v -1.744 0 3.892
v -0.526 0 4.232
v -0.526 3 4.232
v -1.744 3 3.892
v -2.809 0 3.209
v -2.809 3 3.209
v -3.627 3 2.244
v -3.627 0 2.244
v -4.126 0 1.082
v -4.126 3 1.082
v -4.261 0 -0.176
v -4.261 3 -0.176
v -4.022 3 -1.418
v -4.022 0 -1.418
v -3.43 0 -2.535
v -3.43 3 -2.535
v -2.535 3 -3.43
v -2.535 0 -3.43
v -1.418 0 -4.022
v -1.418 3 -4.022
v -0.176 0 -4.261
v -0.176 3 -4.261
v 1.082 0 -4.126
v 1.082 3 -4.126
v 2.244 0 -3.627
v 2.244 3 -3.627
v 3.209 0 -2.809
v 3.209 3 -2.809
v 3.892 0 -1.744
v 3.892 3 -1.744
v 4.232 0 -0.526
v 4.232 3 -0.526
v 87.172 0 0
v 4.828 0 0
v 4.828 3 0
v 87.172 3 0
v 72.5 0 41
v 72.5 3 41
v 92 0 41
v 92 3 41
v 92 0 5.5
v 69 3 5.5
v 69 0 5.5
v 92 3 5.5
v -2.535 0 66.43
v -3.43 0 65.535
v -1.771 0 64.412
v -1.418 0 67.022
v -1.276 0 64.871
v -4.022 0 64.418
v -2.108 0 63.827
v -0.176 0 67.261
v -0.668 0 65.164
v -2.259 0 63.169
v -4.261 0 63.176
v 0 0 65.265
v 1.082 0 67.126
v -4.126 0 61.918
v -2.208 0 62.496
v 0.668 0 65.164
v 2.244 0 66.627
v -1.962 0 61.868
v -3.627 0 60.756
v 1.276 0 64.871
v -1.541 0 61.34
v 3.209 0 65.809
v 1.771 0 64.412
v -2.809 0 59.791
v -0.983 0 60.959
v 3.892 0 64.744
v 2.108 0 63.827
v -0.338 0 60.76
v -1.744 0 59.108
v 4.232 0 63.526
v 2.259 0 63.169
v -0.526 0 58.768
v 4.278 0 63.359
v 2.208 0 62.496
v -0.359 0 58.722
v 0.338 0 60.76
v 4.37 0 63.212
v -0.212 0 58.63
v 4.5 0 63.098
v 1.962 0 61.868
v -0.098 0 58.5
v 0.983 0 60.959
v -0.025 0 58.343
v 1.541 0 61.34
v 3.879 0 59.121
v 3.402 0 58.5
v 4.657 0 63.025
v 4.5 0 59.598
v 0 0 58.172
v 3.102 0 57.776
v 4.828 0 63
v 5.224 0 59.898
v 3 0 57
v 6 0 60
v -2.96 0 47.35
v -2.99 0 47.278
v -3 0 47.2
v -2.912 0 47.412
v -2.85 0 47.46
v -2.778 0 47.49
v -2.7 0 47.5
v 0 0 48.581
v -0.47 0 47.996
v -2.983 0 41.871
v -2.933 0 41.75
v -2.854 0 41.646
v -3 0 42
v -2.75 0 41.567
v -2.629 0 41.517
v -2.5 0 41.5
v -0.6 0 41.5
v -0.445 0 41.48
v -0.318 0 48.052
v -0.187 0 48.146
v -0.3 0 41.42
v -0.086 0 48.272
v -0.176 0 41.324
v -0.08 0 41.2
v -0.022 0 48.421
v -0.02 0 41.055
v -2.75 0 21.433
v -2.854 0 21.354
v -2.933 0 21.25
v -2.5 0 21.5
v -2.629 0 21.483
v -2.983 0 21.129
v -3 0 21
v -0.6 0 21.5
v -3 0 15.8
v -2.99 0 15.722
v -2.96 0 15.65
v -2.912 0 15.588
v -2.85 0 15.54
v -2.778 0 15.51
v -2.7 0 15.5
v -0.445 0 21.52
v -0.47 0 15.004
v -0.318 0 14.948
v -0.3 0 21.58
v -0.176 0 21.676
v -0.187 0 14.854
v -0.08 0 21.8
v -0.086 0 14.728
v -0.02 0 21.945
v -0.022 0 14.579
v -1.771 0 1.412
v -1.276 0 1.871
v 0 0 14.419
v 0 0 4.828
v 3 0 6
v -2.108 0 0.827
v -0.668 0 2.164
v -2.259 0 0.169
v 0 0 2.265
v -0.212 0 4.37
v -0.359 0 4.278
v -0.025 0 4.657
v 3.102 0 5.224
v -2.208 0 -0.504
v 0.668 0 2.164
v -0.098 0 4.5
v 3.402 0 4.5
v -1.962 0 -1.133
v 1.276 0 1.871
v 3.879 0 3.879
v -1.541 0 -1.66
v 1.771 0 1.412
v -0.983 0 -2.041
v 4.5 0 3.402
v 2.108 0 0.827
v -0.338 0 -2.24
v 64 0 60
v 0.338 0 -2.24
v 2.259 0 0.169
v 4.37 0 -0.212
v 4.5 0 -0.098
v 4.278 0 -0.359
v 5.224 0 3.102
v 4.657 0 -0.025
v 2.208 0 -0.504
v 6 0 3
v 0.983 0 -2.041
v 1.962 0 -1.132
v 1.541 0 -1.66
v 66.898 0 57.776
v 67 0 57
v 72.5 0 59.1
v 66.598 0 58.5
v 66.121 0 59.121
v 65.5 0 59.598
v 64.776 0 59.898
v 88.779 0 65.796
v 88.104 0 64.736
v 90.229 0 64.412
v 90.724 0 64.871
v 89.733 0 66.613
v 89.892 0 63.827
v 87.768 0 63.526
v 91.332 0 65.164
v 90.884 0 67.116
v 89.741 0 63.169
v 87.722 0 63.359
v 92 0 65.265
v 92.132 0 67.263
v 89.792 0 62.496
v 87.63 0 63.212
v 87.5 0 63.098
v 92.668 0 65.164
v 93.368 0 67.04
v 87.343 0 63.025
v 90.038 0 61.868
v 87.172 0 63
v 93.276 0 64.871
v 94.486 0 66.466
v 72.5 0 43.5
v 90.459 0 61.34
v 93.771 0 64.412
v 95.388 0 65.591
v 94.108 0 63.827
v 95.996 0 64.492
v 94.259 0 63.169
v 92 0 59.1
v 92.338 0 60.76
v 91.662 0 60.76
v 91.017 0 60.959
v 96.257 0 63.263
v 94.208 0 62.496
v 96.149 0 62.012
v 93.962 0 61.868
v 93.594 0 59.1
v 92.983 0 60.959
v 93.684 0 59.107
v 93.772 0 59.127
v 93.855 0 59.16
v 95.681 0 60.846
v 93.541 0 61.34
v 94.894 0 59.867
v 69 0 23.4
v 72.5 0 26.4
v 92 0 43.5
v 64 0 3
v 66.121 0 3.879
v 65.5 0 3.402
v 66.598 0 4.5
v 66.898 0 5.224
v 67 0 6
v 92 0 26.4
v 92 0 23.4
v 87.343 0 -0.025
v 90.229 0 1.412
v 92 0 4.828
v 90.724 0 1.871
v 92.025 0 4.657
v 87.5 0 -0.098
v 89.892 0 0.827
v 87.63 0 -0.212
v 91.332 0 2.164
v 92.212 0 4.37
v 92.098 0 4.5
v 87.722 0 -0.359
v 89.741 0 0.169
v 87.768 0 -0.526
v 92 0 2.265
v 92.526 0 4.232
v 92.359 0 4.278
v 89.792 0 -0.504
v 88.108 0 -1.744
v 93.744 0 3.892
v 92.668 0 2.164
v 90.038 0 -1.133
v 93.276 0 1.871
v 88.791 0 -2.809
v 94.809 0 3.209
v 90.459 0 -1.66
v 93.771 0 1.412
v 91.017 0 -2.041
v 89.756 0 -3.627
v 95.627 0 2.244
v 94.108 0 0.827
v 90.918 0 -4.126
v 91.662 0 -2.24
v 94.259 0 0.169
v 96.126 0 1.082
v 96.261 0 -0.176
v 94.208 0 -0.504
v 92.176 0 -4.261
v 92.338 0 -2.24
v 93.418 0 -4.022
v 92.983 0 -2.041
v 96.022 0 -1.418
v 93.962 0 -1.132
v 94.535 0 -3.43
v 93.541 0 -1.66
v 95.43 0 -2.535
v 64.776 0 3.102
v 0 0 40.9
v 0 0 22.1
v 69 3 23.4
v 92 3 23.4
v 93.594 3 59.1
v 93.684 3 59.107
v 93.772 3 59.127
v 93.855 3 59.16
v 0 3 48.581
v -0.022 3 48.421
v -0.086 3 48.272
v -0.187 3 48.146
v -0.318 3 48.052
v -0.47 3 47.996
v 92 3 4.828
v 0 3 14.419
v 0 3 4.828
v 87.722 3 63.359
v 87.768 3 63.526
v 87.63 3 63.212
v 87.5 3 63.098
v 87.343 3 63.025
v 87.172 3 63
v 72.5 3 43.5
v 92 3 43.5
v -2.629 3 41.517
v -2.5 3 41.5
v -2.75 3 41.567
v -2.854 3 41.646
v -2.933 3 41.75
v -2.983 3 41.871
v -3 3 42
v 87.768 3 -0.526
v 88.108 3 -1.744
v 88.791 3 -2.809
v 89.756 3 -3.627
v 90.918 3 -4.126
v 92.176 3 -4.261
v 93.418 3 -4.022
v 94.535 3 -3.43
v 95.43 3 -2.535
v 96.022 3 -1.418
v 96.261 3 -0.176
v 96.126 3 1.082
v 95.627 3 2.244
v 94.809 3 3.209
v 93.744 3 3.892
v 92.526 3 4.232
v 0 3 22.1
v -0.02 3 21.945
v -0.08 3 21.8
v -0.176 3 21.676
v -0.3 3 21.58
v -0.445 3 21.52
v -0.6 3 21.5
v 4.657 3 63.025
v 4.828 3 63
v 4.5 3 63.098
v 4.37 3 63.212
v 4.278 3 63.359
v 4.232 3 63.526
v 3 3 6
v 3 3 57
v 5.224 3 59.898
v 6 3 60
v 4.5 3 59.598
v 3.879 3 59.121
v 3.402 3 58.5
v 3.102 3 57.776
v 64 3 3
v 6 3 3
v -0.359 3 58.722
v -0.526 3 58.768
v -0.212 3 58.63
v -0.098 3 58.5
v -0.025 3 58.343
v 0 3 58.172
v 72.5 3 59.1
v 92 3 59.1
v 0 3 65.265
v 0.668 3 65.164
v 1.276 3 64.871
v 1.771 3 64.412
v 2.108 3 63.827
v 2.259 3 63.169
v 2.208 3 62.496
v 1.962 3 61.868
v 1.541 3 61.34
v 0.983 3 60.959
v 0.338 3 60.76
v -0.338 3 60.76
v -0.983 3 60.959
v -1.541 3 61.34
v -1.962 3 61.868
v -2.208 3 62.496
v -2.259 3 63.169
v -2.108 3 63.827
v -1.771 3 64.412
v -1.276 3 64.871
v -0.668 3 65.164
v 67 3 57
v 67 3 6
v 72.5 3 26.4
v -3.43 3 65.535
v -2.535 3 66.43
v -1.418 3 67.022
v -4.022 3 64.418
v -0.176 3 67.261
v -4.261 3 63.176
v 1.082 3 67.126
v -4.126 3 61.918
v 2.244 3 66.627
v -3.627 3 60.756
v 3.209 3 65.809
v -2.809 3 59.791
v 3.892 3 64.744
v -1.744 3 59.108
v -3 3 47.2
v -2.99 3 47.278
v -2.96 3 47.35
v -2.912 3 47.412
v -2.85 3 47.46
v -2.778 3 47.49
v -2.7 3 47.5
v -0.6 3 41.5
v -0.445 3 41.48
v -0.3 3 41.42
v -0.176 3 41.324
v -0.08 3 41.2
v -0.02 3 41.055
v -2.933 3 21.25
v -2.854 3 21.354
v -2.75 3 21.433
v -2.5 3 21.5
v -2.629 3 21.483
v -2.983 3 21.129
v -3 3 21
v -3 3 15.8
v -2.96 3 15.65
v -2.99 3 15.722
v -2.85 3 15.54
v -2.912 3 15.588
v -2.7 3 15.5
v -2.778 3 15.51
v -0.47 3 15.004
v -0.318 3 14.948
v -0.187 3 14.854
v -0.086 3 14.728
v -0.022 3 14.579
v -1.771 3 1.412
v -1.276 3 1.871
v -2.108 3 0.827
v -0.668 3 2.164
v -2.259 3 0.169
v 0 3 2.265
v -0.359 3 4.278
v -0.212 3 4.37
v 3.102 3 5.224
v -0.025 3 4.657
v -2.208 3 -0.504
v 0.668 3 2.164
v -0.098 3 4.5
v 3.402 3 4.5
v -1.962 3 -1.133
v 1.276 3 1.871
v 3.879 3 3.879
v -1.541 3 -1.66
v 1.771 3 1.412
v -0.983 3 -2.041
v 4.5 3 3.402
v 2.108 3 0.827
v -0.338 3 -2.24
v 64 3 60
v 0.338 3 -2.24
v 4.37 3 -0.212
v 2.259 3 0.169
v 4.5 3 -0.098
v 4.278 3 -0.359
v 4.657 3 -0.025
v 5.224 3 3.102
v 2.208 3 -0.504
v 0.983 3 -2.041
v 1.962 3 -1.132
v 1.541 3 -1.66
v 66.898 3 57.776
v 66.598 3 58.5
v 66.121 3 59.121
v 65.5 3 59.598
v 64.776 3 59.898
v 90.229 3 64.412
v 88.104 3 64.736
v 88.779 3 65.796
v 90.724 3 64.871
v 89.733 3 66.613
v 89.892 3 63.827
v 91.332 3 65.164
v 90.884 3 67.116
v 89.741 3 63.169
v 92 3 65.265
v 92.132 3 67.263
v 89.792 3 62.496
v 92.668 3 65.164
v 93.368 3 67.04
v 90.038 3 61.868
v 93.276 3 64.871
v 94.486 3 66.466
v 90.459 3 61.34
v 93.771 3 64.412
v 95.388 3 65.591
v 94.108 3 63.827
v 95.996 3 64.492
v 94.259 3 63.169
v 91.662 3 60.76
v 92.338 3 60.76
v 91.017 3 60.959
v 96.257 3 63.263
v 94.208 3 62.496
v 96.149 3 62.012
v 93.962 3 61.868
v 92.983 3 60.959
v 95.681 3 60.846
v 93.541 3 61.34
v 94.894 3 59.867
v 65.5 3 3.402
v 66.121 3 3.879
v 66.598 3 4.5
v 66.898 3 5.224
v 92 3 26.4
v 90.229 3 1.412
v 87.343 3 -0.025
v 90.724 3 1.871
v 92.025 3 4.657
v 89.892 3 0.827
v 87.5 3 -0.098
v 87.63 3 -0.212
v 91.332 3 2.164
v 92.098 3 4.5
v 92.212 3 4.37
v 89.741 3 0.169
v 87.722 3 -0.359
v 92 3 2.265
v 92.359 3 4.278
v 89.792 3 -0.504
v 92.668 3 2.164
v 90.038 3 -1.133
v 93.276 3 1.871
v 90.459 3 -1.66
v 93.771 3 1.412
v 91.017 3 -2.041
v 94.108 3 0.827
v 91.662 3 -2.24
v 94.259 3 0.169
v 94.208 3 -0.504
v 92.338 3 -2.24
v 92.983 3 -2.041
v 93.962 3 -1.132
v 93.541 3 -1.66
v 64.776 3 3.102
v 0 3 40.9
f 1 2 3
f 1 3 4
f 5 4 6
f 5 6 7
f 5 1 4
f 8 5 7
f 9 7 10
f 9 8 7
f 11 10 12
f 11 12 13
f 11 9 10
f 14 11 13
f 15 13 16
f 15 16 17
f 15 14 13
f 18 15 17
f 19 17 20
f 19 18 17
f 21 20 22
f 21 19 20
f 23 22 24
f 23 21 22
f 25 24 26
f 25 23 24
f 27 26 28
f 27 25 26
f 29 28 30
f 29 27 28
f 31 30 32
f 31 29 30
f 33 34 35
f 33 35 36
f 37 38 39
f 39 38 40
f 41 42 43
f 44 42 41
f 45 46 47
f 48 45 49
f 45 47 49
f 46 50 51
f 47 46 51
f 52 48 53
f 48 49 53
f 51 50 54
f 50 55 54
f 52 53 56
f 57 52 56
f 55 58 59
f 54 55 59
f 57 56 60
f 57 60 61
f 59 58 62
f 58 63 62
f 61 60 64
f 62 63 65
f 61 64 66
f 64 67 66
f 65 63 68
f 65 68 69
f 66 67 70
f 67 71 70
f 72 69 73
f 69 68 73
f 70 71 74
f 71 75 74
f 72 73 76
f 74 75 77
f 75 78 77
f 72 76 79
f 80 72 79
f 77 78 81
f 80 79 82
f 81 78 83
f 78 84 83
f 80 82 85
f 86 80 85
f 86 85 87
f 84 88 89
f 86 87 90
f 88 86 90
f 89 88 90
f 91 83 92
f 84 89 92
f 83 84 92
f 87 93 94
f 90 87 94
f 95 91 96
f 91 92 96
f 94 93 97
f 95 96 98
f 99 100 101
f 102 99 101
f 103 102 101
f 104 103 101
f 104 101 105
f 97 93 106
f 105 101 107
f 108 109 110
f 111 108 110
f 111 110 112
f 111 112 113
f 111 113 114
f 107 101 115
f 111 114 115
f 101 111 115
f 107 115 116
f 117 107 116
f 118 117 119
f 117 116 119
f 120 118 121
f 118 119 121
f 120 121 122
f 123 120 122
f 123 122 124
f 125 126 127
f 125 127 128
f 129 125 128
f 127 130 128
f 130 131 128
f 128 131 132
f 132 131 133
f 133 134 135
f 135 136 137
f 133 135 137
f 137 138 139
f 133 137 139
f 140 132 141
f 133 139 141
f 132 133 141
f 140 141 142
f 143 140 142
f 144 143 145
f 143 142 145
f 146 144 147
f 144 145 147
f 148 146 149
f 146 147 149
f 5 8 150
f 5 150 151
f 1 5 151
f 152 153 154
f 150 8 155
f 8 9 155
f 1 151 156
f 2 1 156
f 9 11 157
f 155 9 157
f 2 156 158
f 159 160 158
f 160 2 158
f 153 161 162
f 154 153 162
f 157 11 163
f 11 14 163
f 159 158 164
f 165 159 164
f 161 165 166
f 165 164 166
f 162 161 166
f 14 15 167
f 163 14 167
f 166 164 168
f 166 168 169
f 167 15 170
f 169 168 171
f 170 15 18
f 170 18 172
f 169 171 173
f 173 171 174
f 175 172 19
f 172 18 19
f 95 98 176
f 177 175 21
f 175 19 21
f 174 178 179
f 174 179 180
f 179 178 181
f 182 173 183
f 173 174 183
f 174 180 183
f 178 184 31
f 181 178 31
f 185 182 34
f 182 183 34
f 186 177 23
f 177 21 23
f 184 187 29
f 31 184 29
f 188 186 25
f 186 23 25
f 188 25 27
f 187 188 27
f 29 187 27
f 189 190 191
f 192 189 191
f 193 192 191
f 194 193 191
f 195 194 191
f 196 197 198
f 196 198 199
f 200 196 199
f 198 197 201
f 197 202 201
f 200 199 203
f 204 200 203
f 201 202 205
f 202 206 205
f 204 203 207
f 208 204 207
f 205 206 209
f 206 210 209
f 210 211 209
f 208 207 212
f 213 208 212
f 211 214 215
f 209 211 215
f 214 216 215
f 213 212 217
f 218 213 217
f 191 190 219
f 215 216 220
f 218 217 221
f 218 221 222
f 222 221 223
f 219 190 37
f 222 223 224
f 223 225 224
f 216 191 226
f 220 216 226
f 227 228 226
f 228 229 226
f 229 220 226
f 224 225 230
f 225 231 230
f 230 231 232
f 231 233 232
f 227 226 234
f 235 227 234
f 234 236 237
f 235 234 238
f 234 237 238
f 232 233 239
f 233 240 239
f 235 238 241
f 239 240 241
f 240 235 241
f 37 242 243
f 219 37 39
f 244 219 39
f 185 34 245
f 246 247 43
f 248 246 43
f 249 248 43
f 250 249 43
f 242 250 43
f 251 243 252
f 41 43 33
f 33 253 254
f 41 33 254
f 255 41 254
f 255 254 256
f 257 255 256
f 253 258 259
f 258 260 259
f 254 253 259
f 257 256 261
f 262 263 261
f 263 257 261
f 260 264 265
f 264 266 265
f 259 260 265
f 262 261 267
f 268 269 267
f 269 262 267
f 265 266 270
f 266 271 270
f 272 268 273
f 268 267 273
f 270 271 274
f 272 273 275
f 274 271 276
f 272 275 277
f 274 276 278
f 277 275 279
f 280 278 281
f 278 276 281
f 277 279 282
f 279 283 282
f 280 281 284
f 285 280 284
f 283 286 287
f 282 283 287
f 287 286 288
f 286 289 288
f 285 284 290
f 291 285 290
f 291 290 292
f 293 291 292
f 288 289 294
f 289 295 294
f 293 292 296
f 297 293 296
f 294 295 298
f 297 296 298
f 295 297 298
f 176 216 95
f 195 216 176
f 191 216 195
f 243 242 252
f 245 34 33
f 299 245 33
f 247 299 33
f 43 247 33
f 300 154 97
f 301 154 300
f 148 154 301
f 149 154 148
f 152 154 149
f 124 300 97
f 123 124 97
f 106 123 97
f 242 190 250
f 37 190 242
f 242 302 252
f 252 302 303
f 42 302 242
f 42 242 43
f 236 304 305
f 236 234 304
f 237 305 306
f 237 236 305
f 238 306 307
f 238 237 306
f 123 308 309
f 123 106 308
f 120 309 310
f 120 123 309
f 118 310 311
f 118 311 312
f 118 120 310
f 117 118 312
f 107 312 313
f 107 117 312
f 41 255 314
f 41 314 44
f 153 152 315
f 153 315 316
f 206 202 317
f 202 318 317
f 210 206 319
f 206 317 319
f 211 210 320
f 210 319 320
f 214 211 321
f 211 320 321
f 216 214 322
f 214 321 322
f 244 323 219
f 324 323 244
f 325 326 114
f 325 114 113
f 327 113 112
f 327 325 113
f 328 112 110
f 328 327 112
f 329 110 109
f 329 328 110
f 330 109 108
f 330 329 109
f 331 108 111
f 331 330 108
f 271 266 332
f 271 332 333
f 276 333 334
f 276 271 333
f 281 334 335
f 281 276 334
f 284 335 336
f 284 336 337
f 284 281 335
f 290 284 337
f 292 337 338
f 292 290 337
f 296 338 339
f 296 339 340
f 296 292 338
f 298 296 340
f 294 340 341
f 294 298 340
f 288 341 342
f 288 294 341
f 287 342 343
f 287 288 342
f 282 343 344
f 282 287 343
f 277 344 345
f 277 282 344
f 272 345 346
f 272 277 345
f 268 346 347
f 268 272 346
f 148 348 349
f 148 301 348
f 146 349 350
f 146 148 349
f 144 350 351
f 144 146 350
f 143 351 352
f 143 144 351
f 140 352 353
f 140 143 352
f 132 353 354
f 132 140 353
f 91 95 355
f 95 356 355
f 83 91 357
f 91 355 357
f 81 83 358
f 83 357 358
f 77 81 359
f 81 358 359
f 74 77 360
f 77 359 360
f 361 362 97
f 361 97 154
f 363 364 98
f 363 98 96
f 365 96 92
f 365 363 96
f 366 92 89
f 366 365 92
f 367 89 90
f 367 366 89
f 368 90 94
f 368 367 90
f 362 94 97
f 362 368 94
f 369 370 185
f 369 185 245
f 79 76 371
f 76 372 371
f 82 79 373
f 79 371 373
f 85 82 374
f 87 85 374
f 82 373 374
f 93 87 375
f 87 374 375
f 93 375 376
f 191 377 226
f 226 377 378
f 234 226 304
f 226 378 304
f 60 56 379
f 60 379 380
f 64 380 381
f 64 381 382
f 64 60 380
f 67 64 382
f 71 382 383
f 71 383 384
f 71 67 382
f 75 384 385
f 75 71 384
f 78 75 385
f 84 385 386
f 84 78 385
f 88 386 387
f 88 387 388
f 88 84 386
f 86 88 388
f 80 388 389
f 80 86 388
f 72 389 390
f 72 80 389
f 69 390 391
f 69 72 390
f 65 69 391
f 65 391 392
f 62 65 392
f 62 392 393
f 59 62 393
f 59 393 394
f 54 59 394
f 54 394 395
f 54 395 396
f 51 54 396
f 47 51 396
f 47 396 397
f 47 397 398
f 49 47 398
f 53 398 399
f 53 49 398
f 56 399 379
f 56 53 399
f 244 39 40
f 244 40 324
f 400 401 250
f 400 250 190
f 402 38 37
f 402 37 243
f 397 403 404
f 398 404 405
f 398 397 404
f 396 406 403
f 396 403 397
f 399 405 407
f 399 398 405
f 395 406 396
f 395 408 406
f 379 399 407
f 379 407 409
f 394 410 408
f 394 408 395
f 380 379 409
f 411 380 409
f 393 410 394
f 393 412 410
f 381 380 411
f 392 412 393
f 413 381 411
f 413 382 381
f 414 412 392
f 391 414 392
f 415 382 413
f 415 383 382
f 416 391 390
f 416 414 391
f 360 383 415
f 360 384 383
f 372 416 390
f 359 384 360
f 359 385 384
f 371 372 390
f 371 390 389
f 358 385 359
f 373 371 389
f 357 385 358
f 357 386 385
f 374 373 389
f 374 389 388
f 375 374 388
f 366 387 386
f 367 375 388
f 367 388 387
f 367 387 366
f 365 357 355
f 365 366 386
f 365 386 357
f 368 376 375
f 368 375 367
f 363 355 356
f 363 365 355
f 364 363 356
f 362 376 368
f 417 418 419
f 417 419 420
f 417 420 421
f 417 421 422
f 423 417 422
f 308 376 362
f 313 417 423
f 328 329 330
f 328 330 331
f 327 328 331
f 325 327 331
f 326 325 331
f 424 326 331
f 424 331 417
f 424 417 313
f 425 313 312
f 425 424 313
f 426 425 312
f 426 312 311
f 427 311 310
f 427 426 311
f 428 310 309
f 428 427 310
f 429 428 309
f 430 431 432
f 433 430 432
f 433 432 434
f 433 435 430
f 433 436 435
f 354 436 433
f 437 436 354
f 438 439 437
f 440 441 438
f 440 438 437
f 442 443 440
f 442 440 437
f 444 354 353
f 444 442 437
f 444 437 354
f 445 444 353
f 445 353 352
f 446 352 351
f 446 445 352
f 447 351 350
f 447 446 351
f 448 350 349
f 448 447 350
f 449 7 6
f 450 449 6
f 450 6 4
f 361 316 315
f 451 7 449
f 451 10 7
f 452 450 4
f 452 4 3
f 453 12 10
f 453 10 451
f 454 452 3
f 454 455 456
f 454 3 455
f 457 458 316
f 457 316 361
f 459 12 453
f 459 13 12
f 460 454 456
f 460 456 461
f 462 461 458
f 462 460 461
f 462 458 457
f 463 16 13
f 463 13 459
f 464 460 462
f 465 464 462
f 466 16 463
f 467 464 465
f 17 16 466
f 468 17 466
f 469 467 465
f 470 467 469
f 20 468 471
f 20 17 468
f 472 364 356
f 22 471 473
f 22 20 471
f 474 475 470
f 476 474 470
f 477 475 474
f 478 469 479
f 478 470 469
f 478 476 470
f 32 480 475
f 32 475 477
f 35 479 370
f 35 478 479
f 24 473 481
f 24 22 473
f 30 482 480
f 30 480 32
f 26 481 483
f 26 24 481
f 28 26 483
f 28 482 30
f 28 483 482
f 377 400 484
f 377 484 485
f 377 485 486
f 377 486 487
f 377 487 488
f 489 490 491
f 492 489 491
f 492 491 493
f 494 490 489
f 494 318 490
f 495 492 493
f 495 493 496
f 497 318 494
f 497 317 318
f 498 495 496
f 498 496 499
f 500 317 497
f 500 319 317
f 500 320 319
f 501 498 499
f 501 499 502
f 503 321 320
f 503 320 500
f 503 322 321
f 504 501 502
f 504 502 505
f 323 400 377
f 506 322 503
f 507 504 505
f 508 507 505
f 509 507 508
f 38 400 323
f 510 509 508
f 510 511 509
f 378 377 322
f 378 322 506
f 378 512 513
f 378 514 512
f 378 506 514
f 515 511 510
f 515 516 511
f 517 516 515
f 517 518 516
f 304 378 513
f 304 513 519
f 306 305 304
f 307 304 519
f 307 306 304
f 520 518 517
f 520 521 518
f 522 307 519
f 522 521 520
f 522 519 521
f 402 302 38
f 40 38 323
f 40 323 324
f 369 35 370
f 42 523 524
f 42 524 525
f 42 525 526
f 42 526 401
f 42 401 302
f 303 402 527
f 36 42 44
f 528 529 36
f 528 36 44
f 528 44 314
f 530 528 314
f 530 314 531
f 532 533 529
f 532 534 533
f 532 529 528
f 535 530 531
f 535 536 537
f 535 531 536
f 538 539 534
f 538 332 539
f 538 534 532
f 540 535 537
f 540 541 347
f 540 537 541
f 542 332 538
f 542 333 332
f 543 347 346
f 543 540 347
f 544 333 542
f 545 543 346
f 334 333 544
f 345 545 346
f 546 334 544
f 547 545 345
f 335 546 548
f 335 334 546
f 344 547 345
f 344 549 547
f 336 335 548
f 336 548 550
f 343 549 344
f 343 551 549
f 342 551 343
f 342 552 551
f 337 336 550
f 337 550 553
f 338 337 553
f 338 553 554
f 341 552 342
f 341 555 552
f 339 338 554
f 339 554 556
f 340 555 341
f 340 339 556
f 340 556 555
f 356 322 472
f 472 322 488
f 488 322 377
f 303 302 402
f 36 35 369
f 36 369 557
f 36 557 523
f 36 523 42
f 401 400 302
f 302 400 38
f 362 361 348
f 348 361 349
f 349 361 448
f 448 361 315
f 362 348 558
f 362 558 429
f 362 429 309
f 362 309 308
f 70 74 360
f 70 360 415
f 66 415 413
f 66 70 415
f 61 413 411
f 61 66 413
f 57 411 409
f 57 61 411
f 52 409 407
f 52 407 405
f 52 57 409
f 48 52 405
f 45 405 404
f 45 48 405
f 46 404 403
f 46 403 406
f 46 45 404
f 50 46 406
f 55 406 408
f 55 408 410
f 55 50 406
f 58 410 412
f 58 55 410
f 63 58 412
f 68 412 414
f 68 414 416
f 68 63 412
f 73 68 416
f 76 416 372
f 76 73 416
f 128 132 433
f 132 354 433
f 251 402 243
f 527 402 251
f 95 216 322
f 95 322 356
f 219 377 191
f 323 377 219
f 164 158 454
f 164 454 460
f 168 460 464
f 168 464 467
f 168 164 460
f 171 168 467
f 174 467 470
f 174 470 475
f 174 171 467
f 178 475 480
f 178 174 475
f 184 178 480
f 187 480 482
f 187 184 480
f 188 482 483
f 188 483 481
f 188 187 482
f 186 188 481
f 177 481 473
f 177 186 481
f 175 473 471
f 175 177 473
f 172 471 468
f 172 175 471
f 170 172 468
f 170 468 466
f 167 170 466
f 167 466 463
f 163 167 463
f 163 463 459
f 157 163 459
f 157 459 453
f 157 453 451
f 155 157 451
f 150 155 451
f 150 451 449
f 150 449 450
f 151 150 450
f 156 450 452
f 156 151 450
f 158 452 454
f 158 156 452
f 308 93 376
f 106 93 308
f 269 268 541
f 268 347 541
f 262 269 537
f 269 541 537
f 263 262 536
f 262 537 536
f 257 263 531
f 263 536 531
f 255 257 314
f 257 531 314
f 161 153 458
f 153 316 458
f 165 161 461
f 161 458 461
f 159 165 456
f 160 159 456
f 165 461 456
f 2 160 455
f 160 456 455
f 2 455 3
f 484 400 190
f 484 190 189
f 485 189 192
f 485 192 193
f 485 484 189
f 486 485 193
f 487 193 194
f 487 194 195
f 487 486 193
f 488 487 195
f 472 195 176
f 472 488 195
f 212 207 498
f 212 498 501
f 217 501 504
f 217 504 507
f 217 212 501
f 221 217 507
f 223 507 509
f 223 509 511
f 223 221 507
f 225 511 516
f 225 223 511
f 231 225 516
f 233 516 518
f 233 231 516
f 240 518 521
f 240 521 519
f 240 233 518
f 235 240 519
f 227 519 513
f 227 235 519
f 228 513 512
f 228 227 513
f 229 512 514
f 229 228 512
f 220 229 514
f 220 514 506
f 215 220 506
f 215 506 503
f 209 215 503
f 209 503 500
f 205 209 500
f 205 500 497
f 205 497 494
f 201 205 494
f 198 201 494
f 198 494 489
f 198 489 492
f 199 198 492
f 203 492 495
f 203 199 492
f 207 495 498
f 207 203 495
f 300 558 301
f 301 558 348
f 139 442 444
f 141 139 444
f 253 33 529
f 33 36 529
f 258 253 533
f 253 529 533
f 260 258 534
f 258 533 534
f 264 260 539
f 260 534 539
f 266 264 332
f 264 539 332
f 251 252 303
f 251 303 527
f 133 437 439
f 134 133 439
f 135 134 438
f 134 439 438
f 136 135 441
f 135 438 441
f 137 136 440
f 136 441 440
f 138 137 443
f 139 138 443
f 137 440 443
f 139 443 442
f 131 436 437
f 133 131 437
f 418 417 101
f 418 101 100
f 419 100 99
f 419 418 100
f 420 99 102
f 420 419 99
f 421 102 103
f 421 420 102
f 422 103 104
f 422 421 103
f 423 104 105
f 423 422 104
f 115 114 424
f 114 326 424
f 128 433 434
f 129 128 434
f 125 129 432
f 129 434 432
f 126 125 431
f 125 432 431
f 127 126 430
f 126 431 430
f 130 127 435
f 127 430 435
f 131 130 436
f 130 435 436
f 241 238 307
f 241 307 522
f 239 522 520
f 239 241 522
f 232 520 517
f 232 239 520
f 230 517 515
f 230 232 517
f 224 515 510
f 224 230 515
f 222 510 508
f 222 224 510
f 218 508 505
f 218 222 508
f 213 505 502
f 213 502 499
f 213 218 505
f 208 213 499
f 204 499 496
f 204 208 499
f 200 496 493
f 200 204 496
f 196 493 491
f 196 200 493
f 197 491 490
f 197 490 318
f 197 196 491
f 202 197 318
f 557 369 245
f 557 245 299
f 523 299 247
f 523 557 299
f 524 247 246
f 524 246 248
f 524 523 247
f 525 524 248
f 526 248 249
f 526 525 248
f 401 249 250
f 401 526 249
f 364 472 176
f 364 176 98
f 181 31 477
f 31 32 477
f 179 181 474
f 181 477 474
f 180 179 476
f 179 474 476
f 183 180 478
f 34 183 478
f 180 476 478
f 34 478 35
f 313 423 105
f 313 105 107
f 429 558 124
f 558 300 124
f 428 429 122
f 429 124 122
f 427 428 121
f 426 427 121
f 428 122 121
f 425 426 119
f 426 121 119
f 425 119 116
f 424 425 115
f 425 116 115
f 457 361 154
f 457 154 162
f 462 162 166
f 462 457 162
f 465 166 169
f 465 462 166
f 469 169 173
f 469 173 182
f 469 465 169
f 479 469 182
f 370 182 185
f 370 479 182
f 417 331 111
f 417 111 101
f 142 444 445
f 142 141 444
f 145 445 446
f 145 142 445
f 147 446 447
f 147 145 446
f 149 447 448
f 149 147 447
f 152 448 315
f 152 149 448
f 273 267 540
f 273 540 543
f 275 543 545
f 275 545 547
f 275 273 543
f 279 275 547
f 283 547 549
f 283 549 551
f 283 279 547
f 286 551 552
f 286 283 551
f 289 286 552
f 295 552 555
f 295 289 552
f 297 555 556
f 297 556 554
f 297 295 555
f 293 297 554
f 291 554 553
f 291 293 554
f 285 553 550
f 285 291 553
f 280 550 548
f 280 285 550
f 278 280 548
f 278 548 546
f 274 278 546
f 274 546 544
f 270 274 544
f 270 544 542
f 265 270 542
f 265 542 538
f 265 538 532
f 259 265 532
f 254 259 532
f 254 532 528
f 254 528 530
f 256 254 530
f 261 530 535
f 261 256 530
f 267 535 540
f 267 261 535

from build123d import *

# Parameters (mm, degrees)
SKETCH1_R           = 2.265
BOSS_EXTRUDE1_DEPTH = 3
SKETCH2_W           = 6.5
SKETCH2_H           = 20
CUT_EXTRUDE1_DEPTH  = 3
BOSS_EXTRUDE2_DEPTH = 3
CUT_EXTRUDE2_DEPTH  = 3
SKETCH5_W           = 3
SKETCH5_H           = 20
BOSS_EXTRUDE3_DEPTH = 3
SKETCH6_W           = 27.010134686
SKETCH6_H           = 17.9
CUT_EXTRUDE3_DEPTH  = 3
SKETCH7_W           = 19.5
SKETCH7_H           = 14.6
CUT_EXTRUDE4_DEPTH  = 3
SKETCH8_W           = 19.5
SKETCH8_H           = 15.6
CUT_EXTRUDE5_DEPTH  = 3
SKETCH9_W           = 2.019620965
SKETCH9_H           = 0.574286347
CUT_EXTRUDE6_DEPTH  = 3
FILLET1_R           = 0.6


with BuildPart() as part:
    # Sketch1 → Boss-Extrude1 (new body)
    with BuildSketch(Plane(origin=(0, 0, 0), x_dir=(1, 0, 0), z_dir=(0, 1, 0))):
        with BuildLine():
            Line((4.265, 0), (87.735, 0))
            ThreePointArc((87.735, 0), (95.015810422, 3.015810422), (92, -4.265))
            Line((92, -4.265), (92, -58.735))
            ThreePointArc((92, -58.735), (95.015810422, -66.015810422), (87.735, -63))
            Line((87.735, -63), (4.265, -63))
            ThreePointArc((4.265, -63), (-3.015810422, -66.015810422), (0, -58.735))
            Line((0, -58.735), (0, -4.265))
            ThreePointArc((0, -4.265), (-3.015810422, 3.015810422), (4.265, 0))
        make_face()
        with Locations(Location((0, 0, 0), (0, 0, 270))):
            Circle(SKETCH1_R, mode=Mode.SUBTRACT)
        with Locations(Location((92, 0, 0), (0, 0, 270))):
            Circle(SKETCH1_R, mode=Mode.SUBTRACT)
        with Locations(Location((92, -63, 0), (0, 0, 270))):
            Circle(SKETCH1_R, mode=Mode.SUBTRACT)
        with Locations(Location((0, -63, 0), (0, 0, 270))):
            Circle(SKETCH1_R, mode=Mode.SUBTRACT)
    extrude(amount=BOSS_EXTRUDE1_DEPTH)

    # Sketch2 → Cut-Extrude1 (cut)
    with BuildSketch(Plane(origin=(0, 3, 0), x_dir=(1, 0, 0), z_dir=(0, 1, 0))):
        with Locations((3.25, -31.5)):
            Rectangle(SKETCH2_W, SKETCH2_H)
    extrude(amount=-CUT_EXTRUDE1_DEPTH, mode=Mode.SUBTRACT)

    # Sketch3 → Boss-Extrude2 (add)
    with BuildSketch(Plane(origin=(0, 3, 0), x_dir=(1, 0, 0), z_dir=(0, 1, 0))):
        with BuildLine():
            Line((-2.7, -15.5), (0, -14.9))
            Line((0, -14.9), (0, -21.5))
            Line((0, -21.5), (-2.5, -21.5))
            ThreePointArc((-2.5, -21.5), (-2.853553391, -21.353553391), (-3, -21))
            Line((-3, -21), (-3, -15.8))
            ThreePointArc((-3, -15.8), (-2.912132034, -15.587867966), (-2.7, -15.5))
        make_face()
        with BuildLine():
            Line((-3, -42), (-3, -47.2))
            ThreePointArc((-3, -47.2), (-2.912132034, -47.412132034), (-2.7, -47.5))
            Line((-2.7, -47.5), (0, -48.1))
            Line((0, -48.1), (0, -41.5))
            Line((0, -41.5), (-2.5, -41.5))
            ThreePointArc((-2.5, -41.5), (-2.853553391, -41.646446609), (-3, -42))
        make_face()
    extrude(amount=-BOSS_EXTRUDE2_DEPTH)

    # Sketch4 → Cut-Extrude2 (cut)
    with BuildSketch(Plane(origin=(0, 3, 0), x_dir=(1, 0, 0), z_dir=(0, 1, 0))):
        with BuildLine():
            Line((6, -3), (64, -3))
            ThreePointArc((64, -3), (66.121320344, -3.878679656), (67, -6))
            Line((67, -6), (67, -57))
            ThreePointArc((67, -57), (66.121320344, -59.121320344), (64, -60))
            Line((64, -60), (6, -60))
            ThreePointArc((6, -60), (3.878679656, -59.121320344), (3, -57))
            Line((3, -57), (3, -6))
            ThreePointArc((3, -6), (3.878679656, -3.878679656), (6, -3))
        make_face()
    extrude(amount=-CUT_EXTRUDE2_DEPTH, mode=Mode.SUBTRACT)

    # Sketch5 → Boss-Extrude3 (add)
    with BuildSketch(Plane(origin=(0, 3, 0), x_dir=(1, 0, 0), z_dir=(0, 1, 0))):
        with Locations((1.5, -31.5)):
            Rectangle(SKETCH5_W, SKETCH5_H)
    extrude(amount=-BOSS_EXTRUDE3_DEPTH)

    # Sketch6 → Cut-Extrude3 (cut)
    with BuildSketch(Plane(origin=(0, 3, 0), x_dir=(1, 0, 0), z_dir=(0, 1, 0))):
        with Locations((82.505067343, -14.45)):
            Rectangle(SKETCH6_W, SKETCH6_H)
    extrude(amount=-CUT_EXTRUDE3_DEPTH, mode=Mode.SUBTRACT)

    # Sketch7 → Cut-Extrude4 (cut)
    with BuildSketch(Plane(origin=(0, 3, 0), x_dir=(1, 0, 0), z_dir=(0, 1, 0))):
        with Locations((82.25, -33.7)):
            Rectangle(SKETCH7_W, SKETCH7_H)
    extrude(amount=-CUT_EXTRUDE4_DEPTH, mode=Mode.SUBTRACT)

    # Sketch8 → Cut-Extrude5 (cut)
    with BuildSketch(Plane(origin=(0, 3, 0), x_dir=(1, 0, 0), z_dir=(0, 1, 0))):
        with Locations((82.25, -51.3)):
            Rectangle(SKETCH8_W, SKETCH8_H)
    extrude(amount=-CUT_EXTRUDE5_DEPTH, mode=Mode.SUBTRACT)

    # Sketch9 → Cut-Extrude6 (cut)
    with BuildSketch(Plane(origin=(0, 3, 0), x_dir=(1, 0, 0), z_dir=(0, 1, 0))):
        with Locations((93.009810483, -58.812856827)):
            Rectangle(SKETCH9_W, SKETCH9_H)
    extrude(amount=-CUT_EXTRUDE6_DEPTH, mode=Mode.SUBTRACT)

    # Fillet1
    fillet1_edges = [part.edges().sort_by_distance(p)[0] for p in [
        (0, 1.5, 41.5),
        (92, 1.5, 4.265),
        (0, 1.5, 21.5),
        (87.735, 1.5, 63),
        (4.265, 1.5, 63),
        (0, 1.5, 58.735),
        (0, 1.5, 4.265),
        (4.265, 1.5, 0),
        (87.735, 1.5, 0),
        (93.726332818, 1.5, 59.1),
        (0, 1.5, 14.9),
        (0, 1.5, 48.1),
    ]]
    fillet(fillet1_edges, radius=FILLET1_R)


solid = part.part
